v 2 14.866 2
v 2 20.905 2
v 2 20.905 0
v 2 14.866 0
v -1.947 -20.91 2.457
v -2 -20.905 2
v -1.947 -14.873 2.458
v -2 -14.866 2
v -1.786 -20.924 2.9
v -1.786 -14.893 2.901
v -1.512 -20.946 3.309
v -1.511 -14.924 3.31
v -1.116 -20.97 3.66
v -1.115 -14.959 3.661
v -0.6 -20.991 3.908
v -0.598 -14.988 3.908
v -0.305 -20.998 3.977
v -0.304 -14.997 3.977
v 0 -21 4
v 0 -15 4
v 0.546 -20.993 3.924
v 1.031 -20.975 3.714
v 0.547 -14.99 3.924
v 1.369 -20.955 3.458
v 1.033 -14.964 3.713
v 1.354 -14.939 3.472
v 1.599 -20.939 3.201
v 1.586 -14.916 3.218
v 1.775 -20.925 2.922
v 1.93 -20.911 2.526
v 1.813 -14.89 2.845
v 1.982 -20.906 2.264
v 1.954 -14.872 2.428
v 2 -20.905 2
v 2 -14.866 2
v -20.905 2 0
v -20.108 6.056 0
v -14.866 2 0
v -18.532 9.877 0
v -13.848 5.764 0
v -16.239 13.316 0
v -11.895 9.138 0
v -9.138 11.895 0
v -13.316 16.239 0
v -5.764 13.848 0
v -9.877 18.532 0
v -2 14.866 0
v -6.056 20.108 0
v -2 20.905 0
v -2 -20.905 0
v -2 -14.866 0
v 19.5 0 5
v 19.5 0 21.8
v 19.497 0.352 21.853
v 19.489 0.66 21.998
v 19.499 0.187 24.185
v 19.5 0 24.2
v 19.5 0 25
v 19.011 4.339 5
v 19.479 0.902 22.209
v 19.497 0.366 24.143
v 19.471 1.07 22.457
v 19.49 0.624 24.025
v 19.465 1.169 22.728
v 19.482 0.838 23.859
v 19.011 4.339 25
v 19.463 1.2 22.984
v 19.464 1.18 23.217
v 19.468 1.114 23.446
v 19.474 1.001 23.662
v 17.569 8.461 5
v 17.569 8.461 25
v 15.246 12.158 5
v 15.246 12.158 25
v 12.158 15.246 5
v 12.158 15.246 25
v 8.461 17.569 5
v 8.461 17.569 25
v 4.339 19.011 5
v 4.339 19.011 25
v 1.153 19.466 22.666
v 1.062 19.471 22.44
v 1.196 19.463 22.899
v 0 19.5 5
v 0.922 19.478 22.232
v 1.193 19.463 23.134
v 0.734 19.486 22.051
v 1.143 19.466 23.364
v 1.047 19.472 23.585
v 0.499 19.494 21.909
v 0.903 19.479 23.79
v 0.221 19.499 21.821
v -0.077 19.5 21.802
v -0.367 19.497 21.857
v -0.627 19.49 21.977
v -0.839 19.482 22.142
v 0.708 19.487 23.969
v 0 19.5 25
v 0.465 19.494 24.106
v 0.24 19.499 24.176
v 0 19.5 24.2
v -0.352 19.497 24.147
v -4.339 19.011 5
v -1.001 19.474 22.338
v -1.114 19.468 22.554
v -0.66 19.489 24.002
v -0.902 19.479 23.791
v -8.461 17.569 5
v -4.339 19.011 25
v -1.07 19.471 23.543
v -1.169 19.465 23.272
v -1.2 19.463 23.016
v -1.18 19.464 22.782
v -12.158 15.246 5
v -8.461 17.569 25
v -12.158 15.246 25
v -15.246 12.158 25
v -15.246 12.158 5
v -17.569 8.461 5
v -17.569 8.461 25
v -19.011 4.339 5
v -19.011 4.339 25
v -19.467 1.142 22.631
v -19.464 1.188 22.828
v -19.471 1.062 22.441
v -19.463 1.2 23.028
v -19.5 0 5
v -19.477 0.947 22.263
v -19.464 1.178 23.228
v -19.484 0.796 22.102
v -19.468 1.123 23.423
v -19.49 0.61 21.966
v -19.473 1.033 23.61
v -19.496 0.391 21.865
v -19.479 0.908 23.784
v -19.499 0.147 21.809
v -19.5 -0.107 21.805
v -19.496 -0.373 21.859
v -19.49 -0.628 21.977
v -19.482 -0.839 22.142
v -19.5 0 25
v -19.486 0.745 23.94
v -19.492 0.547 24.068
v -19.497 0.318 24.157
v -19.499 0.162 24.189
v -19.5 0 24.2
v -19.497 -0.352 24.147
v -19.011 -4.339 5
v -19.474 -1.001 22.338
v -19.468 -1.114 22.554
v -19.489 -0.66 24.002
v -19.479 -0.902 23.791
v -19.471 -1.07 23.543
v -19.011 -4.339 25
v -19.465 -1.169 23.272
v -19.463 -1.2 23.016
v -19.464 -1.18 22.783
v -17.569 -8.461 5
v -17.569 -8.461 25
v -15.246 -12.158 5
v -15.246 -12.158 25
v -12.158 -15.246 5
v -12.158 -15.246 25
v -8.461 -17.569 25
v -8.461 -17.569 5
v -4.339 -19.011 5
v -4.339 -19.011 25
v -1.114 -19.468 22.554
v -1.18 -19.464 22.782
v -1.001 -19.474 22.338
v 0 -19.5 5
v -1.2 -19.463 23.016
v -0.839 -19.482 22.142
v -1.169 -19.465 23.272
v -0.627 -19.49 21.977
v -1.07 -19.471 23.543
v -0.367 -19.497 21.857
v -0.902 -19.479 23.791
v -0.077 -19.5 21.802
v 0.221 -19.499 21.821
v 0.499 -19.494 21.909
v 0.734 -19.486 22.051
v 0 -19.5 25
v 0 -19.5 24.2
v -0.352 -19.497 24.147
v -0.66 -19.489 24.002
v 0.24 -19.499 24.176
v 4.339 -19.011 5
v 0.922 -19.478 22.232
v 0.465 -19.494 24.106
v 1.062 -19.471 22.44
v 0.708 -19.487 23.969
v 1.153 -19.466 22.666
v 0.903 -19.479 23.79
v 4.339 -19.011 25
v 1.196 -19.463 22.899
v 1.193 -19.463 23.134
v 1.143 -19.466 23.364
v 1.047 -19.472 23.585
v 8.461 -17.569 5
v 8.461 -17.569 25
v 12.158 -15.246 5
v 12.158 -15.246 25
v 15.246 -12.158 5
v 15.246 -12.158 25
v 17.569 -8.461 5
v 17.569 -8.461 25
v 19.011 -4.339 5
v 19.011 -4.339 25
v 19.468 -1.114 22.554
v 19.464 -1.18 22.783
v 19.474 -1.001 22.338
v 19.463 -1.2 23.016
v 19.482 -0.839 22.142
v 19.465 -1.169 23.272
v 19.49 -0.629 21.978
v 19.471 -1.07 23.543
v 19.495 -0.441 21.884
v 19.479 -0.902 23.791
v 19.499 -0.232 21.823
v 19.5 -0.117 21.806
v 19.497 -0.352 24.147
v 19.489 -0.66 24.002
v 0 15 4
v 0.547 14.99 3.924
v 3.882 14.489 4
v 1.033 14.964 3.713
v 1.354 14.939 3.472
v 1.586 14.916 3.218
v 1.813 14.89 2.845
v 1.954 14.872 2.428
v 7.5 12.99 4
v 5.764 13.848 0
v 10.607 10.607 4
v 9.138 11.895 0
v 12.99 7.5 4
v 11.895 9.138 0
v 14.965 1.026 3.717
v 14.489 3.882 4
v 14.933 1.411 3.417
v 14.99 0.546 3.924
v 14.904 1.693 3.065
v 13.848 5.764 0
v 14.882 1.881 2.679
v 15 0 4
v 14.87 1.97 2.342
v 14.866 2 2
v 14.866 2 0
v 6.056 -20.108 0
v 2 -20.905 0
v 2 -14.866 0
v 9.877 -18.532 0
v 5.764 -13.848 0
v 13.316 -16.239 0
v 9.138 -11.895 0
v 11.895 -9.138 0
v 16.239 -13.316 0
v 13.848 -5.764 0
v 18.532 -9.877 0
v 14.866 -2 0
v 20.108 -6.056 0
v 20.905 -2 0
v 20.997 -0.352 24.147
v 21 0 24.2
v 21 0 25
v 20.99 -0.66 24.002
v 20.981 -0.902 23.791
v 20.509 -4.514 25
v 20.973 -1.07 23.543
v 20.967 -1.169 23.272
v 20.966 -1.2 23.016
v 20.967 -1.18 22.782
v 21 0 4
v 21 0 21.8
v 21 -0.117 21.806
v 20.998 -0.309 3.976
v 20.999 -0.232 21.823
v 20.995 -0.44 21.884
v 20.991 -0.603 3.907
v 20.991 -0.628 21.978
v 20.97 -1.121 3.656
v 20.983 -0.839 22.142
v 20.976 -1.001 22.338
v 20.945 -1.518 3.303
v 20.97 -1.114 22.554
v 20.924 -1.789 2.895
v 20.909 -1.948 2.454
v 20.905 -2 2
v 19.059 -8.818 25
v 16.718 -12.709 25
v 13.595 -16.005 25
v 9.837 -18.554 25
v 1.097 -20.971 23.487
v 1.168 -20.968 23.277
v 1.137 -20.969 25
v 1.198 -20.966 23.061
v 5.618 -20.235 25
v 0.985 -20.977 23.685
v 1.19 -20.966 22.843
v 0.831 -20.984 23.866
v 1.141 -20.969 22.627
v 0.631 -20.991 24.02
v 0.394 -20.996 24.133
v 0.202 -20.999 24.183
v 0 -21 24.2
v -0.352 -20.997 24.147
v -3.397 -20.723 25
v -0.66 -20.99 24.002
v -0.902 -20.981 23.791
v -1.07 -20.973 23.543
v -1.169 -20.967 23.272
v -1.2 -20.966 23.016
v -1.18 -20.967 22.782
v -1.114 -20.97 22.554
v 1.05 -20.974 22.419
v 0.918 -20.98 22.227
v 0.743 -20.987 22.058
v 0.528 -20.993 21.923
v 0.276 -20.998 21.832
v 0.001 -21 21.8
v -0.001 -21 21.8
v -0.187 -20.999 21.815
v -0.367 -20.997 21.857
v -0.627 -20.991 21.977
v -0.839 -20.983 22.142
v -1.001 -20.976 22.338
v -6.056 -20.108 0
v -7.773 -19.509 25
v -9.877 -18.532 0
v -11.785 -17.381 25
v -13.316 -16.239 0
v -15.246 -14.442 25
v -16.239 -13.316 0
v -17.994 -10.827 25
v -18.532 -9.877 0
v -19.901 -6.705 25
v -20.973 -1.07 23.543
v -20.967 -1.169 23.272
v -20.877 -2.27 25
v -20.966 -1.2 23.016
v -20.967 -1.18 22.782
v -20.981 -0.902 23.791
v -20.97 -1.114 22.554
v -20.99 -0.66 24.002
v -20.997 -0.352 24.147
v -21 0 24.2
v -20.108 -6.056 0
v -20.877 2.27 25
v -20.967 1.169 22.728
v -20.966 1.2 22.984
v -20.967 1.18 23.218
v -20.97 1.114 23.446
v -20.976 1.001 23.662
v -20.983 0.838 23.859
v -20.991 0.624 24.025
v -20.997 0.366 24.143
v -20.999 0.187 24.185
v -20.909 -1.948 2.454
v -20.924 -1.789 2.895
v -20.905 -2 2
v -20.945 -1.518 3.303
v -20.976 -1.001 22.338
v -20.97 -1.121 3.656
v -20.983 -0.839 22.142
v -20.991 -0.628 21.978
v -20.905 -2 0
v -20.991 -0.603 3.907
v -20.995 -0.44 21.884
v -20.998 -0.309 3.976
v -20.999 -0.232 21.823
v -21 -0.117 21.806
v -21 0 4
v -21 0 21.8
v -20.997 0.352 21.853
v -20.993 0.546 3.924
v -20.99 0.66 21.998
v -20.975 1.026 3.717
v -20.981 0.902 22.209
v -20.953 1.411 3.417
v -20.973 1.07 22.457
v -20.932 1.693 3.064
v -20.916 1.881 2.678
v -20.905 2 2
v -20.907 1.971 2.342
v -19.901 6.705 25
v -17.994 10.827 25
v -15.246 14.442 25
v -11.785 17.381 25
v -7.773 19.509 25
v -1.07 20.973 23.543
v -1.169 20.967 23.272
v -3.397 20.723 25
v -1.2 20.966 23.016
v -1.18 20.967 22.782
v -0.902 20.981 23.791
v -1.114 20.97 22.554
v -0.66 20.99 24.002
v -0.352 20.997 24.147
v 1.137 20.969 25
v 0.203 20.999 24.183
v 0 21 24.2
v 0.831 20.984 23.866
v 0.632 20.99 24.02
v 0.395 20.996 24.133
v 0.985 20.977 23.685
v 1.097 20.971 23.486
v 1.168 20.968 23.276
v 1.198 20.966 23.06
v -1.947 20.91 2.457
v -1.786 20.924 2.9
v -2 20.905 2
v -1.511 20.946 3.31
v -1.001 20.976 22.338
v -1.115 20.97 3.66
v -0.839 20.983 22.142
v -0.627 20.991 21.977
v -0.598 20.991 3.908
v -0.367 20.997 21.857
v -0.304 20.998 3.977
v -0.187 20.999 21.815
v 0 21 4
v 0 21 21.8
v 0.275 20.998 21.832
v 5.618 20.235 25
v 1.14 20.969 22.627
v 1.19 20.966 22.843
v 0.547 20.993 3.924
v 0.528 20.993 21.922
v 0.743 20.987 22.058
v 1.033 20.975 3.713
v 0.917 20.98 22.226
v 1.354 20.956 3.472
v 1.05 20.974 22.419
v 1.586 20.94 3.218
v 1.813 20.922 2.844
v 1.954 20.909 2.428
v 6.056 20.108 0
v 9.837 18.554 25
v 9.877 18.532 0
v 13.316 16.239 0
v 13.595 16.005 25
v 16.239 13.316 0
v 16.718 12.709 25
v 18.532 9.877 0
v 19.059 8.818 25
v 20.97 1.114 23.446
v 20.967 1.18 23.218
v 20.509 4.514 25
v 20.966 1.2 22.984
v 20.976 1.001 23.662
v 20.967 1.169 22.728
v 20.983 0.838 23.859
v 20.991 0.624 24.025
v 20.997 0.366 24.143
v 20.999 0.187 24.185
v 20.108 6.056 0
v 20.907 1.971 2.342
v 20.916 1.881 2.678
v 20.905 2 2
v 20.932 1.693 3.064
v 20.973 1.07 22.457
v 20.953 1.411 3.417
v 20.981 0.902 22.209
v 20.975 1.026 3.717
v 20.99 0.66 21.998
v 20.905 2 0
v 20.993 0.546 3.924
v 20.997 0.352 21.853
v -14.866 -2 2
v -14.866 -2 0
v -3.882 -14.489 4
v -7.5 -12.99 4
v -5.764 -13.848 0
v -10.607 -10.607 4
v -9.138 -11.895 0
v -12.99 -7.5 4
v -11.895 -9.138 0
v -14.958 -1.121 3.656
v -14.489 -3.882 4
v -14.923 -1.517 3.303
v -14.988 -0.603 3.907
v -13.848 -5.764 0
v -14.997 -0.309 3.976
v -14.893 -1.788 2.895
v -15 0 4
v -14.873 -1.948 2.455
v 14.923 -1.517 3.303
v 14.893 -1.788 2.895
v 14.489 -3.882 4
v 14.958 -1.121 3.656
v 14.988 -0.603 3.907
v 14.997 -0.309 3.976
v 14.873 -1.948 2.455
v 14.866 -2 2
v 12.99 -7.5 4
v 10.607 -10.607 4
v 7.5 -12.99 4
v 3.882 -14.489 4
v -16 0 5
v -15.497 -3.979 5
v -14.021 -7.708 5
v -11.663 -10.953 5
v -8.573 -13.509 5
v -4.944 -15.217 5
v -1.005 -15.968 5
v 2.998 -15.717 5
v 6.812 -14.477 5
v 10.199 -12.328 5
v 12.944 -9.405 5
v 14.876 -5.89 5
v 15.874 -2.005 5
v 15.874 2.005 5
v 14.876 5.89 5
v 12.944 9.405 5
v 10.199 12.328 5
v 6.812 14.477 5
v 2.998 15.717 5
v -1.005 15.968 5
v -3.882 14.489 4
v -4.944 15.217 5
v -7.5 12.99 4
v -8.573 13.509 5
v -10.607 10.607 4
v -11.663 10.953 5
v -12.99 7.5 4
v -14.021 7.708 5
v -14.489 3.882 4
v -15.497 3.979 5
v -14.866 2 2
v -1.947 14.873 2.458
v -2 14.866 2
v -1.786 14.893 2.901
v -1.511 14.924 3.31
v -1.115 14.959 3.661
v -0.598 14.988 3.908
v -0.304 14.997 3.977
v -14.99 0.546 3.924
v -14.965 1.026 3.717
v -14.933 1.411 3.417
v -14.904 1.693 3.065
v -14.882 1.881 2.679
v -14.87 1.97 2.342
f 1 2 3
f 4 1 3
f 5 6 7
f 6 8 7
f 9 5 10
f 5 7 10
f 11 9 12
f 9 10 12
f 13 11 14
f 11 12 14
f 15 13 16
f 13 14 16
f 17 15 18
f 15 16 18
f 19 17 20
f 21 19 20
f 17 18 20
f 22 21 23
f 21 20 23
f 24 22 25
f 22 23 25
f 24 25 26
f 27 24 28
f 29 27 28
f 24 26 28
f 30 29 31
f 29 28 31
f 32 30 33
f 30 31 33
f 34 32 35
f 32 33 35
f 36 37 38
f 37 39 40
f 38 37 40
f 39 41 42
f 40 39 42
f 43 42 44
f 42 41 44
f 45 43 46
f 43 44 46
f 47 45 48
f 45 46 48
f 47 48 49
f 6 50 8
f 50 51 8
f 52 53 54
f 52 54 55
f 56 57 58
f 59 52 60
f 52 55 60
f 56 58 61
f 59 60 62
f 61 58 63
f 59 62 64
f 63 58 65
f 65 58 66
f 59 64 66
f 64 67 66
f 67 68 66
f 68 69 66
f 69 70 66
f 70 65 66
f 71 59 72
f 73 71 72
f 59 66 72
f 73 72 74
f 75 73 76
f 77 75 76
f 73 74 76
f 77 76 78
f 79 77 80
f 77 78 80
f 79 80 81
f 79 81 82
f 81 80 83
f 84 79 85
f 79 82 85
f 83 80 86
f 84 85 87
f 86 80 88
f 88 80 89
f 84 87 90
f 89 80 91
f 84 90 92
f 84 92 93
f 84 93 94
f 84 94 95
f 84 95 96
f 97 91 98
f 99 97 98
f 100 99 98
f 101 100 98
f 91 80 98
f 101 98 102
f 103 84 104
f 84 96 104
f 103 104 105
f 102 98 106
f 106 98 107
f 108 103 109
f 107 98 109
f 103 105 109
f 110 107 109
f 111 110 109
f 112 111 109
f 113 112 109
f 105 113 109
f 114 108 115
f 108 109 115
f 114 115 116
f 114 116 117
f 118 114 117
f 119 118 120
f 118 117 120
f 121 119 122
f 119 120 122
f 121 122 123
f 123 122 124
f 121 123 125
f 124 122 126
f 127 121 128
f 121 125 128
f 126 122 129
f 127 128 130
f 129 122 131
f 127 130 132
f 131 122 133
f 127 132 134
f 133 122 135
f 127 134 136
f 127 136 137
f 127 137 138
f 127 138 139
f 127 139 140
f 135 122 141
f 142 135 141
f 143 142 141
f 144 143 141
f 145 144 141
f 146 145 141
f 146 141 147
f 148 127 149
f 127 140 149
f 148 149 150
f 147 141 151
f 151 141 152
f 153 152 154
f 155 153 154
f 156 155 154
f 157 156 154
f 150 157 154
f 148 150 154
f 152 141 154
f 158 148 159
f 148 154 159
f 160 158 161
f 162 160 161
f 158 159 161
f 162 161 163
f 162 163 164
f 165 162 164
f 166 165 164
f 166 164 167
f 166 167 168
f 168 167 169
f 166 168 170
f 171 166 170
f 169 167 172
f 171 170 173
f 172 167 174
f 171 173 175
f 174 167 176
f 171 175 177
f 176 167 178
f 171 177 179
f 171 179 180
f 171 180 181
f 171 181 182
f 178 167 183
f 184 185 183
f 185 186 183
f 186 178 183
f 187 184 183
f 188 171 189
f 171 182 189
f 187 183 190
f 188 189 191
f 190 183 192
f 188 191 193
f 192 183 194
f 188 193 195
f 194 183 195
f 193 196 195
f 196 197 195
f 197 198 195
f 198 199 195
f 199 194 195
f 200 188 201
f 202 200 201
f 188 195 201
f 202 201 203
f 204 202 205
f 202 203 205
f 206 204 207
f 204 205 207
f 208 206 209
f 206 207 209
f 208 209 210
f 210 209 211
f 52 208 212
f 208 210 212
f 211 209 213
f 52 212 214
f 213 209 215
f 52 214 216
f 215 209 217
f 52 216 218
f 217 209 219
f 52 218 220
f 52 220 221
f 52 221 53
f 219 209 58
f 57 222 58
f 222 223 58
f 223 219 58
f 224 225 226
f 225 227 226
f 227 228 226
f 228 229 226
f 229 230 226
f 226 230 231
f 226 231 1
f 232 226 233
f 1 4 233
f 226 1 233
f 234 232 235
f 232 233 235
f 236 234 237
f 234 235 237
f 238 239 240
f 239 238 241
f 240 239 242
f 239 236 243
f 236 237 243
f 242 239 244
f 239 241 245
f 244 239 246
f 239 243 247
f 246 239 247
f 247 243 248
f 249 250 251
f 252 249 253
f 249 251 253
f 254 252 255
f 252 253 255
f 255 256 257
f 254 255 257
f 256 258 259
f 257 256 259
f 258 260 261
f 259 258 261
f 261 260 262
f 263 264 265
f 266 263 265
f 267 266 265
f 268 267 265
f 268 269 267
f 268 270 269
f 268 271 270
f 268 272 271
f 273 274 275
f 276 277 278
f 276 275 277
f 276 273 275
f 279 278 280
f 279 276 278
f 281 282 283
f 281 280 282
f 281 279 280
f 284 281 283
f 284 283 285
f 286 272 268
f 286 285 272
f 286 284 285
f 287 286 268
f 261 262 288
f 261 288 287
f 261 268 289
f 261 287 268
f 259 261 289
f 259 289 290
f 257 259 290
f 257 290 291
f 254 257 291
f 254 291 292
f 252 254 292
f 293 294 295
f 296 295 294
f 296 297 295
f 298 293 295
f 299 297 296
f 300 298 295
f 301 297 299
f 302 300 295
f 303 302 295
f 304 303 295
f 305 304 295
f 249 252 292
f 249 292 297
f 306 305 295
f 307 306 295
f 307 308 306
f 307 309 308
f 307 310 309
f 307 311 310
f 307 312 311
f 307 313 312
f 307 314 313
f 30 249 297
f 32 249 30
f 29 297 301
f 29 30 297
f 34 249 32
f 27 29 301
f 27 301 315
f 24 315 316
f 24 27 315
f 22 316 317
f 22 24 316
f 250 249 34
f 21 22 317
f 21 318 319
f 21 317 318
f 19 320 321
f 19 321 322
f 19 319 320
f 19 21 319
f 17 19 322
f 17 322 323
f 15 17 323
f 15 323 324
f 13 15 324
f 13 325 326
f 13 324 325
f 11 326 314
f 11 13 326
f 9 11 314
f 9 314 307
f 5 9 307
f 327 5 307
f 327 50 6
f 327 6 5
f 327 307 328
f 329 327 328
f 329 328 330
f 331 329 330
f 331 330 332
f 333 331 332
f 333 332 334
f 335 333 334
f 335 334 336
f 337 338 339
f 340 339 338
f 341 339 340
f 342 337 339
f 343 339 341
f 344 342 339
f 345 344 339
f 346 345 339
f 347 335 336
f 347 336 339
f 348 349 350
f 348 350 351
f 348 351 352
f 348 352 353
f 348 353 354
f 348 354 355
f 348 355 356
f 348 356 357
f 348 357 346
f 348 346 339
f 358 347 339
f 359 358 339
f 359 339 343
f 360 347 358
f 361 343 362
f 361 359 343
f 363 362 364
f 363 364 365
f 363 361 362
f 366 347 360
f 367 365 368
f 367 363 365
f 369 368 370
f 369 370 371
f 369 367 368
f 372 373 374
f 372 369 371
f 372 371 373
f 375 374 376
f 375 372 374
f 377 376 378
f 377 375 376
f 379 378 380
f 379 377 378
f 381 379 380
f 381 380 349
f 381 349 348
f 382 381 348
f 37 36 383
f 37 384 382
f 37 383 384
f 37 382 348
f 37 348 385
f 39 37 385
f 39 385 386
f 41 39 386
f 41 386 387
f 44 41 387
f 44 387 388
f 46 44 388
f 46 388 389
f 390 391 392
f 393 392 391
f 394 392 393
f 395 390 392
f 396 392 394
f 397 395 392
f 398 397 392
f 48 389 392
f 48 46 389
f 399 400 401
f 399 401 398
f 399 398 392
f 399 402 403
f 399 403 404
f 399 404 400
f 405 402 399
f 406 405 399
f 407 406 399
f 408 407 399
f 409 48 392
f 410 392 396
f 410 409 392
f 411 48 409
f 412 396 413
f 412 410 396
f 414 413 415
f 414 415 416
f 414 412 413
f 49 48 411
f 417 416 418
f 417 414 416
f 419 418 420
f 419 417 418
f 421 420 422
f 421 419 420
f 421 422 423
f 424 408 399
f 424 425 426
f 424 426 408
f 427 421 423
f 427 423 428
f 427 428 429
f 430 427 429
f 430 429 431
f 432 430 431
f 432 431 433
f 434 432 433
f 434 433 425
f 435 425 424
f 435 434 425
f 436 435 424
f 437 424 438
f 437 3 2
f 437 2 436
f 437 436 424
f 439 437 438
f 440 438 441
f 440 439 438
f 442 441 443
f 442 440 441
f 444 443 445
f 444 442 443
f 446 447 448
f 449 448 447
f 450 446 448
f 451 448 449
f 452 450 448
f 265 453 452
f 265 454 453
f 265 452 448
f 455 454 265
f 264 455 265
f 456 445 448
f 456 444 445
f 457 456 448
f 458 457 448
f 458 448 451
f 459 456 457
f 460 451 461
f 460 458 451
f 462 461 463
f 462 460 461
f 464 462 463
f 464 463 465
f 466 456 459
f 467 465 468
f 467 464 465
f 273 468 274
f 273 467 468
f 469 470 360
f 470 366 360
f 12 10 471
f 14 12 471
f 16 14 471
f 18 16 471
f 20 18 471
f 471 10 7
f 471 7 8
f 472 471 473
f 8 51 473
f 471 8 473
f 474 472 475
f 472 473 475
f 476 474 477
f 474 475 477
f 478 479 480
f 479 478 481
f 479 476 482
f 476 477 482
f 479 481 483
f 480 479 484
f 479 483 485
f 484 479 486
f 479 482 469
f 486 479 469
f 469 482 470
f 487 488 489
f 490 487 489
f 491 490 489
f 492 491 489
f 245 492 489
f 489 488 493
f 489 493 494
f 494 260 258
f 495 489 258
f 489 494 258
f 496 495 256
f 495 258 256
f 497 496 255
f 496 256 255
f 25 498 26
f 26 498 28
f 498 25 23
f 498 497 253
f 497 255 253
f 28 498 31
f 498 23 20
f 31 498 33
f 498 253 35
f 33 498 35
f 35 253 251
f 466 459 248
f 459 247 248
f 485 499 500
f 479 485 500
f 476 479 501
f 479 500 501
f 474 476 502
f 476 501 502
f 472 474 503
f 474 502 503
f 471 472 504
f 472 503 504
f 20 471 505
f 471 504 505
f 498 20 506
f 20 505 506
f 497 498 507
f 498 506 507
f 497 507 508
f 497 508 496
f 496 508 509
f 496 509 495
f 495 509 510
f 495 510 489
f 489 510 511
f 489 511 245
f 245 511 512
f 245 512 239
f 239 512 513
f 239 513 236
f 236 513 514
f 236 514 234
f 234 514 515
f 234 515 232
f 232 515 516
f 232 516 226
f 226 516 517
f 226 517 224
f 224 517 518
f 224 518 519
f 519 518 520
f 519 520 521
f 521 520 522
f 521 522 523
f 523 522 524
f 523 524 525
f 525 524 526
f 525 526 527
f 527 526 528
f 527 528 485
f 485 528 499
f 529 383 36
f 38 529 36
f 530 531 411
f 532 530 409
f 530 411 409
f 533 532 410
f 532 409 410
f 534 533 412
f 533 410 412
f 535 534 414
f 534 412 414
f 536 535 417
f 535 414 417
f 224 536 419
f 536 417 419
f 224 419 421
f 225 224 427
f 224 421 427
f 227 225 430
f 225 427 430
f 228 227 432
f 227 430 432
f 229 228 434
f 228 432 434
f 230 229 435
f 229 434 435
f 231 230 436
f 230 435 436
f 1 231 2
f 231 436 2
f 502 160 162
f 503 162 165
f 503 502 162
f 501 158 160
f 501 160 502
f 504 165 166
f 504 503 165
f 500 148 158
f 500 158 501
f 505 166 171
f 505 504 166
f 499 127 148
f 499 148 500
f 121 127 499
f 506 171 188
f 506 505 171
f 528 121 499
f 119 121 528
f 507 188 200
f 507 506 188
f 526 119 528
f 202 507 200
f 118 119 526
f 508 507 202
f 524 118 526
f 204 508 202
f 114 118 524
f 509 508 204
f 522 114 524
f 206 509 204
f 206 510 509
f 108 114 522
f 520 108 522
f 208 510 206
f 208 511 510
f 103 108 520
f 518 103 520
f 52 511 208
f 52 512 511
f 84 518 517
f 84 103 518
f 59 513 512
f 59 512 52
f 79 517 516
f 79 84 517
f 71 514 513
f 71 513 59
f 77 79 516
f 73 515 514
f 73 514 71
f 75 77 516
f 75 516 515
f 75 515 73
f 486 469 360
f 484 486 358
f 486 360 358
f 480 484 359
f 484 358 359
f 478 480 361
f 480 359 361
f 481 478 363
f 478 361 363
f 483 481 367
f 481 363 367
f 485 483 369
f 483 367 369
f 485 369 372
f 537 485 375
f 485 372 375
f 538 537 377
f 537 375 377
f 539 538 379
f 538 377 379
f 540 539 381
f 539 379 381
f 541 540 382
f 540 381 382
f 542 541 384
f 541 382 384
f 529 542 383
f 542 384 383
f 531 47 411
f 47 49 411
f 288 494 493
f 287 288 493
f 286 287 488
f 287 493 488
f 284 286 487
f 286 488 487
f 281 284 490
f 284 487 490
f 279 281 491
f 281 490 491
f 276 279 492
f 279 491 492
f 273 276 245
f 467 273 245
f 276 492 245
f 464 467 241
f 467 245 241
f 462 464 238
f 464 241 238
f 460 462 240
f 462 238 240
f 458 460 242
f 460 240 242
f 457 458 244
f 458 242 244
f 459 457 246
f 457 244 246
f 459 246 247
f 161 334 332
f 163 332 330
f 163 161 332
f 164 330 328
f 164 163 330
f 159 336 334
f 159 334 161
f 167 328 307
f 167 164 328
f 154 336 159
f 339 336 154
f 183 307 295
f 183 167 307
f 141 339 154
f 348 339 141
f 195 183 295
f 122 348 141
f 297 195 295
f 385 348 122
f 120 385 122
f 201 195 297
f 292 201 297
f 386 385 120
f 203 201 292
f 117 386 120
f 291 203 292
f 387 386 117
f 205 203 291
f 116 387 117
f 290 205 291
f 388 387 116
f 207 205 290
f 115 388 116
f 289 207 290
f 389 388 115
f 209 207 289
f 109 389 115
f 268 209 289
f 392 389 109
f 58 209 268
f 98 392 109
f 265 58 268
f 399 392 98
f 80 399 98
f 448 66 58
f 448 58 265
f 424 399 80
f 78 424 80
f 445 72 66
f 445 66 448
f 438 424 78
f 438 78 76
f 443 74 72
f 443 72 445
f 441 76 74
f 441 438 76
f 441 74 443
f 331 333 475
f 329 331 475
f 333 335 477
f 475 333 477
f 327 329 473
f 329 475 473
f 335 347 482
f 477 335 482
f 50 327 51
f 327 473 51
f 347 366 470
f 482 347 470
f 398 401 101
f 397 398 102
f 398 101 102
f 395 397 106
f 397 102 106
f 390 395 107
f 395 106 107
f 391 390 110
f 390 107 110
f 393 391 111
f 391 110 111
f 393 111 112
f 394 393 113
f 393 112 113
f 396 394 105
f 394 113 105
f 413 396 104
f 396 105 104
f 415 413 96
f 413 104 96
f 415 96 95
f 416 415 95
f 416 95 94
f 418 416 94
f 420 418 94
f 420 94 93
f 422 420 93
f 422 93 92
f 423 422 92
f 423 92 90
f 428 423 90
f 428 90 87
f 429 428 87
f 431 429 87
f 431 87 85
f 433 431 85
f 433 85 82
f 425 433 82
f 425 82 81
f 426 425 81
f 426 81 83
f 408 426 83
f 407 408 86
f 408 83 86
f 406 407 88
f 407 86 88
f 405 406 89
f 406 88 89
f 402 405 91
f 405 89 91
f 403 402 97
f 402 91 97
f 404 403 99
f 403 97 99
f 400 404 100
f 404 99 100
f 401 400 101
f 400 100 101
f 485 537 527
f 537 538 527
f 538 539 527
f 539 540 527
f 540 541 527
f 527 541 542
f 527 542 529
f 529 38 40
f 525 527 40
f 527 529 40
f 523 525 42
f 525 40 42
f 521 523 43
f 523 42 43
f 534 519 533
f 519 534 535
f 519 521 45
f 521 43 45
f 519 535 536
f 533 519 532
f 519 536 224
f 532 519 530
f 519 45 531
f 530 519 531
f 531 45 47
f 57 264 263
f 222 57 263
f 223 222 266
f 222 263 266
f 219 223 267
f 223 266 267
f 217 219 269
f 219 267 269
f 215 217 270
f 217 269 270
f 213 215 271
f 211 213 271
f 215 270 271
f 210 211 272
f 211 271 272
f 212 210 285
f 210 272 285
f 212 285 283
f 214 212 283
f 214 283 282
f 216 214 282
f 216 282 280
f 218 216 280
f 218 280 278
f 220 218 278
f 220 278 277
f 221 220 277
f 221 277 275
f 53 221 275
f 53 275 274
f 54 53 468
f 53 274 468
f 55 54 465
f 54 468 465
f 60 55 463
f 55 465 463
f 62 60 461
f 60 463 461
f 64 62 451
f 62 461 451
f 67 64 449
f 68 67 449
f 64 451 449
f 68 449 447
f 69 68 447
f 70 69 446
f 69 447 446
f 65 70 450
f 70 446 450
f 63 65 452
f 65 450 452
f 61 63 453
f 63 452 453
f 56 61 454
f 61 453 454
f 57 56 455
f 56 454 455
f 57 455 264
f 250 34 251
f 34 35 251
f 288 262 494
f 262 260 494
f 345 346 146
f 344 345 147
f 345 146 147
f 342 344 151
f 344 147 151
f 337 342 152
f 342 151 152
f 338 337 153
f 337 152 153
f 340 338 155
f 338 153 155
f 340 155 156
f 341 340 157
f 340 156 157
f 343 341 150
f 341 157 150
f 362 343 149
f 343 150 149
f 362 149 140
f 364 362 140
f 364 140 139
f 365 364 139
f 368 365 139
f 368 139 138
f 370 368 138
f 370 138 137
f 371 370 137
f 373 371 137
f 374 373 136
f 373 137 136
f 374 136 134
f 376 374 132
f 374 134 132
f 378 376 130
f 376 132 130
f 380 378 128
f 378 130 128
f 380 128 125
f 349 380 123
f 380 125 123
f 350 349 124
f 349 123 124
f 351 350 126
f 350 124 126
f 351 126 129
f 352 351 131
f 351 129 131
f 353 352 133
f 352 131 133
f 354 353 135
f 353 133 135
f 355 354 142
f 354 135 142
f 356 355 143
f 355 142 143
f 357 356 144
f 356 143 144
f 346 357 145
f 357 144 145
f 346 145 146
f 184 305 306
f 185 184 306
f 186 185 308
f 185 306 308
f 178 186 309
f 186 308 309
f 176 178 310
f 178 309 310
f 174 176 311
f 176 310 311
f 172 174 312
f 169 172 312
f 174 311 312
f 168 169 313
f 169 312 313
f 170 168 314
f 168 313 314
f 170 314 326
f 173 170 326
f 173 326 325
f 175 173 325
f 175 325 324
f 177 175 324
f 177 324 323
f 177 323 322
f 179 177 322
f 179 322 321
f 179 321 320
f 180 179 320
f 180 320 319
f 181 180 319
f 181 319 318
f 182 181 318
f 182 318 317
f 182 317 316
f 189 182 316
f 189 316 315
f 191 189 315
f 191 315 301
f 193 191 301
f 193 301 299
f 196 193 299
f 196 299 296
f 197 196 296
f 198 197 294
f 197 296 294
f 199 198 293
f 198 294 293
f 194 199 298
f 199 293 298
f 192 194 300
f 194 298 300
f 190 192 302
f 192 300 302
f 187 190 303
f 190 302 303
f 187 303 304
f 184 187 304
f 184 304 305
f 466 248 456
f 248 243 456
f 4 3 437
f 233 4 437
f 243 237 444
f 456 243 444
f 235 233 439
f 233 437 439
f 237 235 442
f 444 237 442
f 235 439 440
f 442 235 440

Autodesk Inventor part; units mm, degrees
ref_plane "YZ Plane" through (0, 0, 0) normal (1, 0, 0) x (0, 1, 0)
ref_plane "XY Plane" through (0, 0, 0) normal (0, 0, 1) x (1, 0, 0)
sketch "Skizze1" plane through (0, 0, 0) normal (0, 0, 1) x (1, 0, 0)
  line L0 (-29.4, 0) -> (29.4, 0) projected
  line L1 (0, -29.4) -> (0, 29.4) projected
  circle A0 centre (0, 0) radius 21
  dimension "d0" = 42
extrude "Extrusion1" add sketch "Skizze1" along normal blind 25
sketch "Skizze2" plane through (0, 0, 25) normal (0, 0, 1) x (1, 0, 0)
  circle A0 centre (0, 0) radius 21 projected
  circle A1 centre (0, 0) radius 19.5
  dimension "d3" = 39
extrude "Extrusion2" cut sketch "Skizze2" against normal blind 20 contours A1
sketch "Skizze3" plane through (0, 0, 0) normal (0, 0, -1) x (-1, 0, 0)
  circle A0 centre (0, 0) radius 21 projected
  circle A1 centre (0, 0) radius 15
  dimension "d6" = 30
extrude "Extrusion3" cut sketch "Skizze3" against normal through all contours A1
ref_plane "Arbeitsebene1" through (0, 21, 0) normal (0, 1, 0) x (-1, 0, 0)
sketch "Skizze5" plane through (0, 21, 0) normal (0, 1, 0) x (-1, 0, 0)
  line L0 (0, -5) -> (0, 30) projected
  line L1 (29.4, 0) -> (-29.4, 0) projected
  line L2 (21, 25) -> (-21, 25) projected
  point P0 (0, 0)
  point P1 (0, 23)
  dimension "d13" = 2
hole "Bohrung1" at (0, 21, 23) direction (0, -1, 0) diameter 2.4 end through all
pattern_circular "Runde Anordnung1" count 4 over 360 about axis through (0, 0, 0) along (0, 0, 1) of "Bohrung1"
chamfer "Fase1" distance 1 angle 45 1 edges at (15, 0, 5)
sketch "Skizze6" plane through (0, 21, 0) normal (0, 1, 0) x (-1, 0, 0)
  line L0 (29.4, 0) -> (-29.4, 0) projected
  line L1 (0, -5) -> (0, 30) projected
  line L2 (-2, 0) -> (2, 0)
  line L3 (2, 0) -> (2, 2)
  line L4 (0, 4) -> (0, 4)
  line L5 (-2, 2) -> (-2, 0)
  arc A0 (2, 2) -> (0, 4) centre (0, 2) ccw
  arc A1 (0, 4) -> (-2, 2) centre (0, 2) ccw
  point P0 (0, 0)
  dimension "d27" = 4
  dimension "d28" = 4
  dimension "d29" = 2
extrude "Extrusion6" cut sketch "Skizze6" against normal through all
pattern_circular "Runde Anordnung2" count 4 over 360 about axis through (0, 0, 0) along (0, 0, 1) of "Extrusion6"
properties part number "13_1087_029"
